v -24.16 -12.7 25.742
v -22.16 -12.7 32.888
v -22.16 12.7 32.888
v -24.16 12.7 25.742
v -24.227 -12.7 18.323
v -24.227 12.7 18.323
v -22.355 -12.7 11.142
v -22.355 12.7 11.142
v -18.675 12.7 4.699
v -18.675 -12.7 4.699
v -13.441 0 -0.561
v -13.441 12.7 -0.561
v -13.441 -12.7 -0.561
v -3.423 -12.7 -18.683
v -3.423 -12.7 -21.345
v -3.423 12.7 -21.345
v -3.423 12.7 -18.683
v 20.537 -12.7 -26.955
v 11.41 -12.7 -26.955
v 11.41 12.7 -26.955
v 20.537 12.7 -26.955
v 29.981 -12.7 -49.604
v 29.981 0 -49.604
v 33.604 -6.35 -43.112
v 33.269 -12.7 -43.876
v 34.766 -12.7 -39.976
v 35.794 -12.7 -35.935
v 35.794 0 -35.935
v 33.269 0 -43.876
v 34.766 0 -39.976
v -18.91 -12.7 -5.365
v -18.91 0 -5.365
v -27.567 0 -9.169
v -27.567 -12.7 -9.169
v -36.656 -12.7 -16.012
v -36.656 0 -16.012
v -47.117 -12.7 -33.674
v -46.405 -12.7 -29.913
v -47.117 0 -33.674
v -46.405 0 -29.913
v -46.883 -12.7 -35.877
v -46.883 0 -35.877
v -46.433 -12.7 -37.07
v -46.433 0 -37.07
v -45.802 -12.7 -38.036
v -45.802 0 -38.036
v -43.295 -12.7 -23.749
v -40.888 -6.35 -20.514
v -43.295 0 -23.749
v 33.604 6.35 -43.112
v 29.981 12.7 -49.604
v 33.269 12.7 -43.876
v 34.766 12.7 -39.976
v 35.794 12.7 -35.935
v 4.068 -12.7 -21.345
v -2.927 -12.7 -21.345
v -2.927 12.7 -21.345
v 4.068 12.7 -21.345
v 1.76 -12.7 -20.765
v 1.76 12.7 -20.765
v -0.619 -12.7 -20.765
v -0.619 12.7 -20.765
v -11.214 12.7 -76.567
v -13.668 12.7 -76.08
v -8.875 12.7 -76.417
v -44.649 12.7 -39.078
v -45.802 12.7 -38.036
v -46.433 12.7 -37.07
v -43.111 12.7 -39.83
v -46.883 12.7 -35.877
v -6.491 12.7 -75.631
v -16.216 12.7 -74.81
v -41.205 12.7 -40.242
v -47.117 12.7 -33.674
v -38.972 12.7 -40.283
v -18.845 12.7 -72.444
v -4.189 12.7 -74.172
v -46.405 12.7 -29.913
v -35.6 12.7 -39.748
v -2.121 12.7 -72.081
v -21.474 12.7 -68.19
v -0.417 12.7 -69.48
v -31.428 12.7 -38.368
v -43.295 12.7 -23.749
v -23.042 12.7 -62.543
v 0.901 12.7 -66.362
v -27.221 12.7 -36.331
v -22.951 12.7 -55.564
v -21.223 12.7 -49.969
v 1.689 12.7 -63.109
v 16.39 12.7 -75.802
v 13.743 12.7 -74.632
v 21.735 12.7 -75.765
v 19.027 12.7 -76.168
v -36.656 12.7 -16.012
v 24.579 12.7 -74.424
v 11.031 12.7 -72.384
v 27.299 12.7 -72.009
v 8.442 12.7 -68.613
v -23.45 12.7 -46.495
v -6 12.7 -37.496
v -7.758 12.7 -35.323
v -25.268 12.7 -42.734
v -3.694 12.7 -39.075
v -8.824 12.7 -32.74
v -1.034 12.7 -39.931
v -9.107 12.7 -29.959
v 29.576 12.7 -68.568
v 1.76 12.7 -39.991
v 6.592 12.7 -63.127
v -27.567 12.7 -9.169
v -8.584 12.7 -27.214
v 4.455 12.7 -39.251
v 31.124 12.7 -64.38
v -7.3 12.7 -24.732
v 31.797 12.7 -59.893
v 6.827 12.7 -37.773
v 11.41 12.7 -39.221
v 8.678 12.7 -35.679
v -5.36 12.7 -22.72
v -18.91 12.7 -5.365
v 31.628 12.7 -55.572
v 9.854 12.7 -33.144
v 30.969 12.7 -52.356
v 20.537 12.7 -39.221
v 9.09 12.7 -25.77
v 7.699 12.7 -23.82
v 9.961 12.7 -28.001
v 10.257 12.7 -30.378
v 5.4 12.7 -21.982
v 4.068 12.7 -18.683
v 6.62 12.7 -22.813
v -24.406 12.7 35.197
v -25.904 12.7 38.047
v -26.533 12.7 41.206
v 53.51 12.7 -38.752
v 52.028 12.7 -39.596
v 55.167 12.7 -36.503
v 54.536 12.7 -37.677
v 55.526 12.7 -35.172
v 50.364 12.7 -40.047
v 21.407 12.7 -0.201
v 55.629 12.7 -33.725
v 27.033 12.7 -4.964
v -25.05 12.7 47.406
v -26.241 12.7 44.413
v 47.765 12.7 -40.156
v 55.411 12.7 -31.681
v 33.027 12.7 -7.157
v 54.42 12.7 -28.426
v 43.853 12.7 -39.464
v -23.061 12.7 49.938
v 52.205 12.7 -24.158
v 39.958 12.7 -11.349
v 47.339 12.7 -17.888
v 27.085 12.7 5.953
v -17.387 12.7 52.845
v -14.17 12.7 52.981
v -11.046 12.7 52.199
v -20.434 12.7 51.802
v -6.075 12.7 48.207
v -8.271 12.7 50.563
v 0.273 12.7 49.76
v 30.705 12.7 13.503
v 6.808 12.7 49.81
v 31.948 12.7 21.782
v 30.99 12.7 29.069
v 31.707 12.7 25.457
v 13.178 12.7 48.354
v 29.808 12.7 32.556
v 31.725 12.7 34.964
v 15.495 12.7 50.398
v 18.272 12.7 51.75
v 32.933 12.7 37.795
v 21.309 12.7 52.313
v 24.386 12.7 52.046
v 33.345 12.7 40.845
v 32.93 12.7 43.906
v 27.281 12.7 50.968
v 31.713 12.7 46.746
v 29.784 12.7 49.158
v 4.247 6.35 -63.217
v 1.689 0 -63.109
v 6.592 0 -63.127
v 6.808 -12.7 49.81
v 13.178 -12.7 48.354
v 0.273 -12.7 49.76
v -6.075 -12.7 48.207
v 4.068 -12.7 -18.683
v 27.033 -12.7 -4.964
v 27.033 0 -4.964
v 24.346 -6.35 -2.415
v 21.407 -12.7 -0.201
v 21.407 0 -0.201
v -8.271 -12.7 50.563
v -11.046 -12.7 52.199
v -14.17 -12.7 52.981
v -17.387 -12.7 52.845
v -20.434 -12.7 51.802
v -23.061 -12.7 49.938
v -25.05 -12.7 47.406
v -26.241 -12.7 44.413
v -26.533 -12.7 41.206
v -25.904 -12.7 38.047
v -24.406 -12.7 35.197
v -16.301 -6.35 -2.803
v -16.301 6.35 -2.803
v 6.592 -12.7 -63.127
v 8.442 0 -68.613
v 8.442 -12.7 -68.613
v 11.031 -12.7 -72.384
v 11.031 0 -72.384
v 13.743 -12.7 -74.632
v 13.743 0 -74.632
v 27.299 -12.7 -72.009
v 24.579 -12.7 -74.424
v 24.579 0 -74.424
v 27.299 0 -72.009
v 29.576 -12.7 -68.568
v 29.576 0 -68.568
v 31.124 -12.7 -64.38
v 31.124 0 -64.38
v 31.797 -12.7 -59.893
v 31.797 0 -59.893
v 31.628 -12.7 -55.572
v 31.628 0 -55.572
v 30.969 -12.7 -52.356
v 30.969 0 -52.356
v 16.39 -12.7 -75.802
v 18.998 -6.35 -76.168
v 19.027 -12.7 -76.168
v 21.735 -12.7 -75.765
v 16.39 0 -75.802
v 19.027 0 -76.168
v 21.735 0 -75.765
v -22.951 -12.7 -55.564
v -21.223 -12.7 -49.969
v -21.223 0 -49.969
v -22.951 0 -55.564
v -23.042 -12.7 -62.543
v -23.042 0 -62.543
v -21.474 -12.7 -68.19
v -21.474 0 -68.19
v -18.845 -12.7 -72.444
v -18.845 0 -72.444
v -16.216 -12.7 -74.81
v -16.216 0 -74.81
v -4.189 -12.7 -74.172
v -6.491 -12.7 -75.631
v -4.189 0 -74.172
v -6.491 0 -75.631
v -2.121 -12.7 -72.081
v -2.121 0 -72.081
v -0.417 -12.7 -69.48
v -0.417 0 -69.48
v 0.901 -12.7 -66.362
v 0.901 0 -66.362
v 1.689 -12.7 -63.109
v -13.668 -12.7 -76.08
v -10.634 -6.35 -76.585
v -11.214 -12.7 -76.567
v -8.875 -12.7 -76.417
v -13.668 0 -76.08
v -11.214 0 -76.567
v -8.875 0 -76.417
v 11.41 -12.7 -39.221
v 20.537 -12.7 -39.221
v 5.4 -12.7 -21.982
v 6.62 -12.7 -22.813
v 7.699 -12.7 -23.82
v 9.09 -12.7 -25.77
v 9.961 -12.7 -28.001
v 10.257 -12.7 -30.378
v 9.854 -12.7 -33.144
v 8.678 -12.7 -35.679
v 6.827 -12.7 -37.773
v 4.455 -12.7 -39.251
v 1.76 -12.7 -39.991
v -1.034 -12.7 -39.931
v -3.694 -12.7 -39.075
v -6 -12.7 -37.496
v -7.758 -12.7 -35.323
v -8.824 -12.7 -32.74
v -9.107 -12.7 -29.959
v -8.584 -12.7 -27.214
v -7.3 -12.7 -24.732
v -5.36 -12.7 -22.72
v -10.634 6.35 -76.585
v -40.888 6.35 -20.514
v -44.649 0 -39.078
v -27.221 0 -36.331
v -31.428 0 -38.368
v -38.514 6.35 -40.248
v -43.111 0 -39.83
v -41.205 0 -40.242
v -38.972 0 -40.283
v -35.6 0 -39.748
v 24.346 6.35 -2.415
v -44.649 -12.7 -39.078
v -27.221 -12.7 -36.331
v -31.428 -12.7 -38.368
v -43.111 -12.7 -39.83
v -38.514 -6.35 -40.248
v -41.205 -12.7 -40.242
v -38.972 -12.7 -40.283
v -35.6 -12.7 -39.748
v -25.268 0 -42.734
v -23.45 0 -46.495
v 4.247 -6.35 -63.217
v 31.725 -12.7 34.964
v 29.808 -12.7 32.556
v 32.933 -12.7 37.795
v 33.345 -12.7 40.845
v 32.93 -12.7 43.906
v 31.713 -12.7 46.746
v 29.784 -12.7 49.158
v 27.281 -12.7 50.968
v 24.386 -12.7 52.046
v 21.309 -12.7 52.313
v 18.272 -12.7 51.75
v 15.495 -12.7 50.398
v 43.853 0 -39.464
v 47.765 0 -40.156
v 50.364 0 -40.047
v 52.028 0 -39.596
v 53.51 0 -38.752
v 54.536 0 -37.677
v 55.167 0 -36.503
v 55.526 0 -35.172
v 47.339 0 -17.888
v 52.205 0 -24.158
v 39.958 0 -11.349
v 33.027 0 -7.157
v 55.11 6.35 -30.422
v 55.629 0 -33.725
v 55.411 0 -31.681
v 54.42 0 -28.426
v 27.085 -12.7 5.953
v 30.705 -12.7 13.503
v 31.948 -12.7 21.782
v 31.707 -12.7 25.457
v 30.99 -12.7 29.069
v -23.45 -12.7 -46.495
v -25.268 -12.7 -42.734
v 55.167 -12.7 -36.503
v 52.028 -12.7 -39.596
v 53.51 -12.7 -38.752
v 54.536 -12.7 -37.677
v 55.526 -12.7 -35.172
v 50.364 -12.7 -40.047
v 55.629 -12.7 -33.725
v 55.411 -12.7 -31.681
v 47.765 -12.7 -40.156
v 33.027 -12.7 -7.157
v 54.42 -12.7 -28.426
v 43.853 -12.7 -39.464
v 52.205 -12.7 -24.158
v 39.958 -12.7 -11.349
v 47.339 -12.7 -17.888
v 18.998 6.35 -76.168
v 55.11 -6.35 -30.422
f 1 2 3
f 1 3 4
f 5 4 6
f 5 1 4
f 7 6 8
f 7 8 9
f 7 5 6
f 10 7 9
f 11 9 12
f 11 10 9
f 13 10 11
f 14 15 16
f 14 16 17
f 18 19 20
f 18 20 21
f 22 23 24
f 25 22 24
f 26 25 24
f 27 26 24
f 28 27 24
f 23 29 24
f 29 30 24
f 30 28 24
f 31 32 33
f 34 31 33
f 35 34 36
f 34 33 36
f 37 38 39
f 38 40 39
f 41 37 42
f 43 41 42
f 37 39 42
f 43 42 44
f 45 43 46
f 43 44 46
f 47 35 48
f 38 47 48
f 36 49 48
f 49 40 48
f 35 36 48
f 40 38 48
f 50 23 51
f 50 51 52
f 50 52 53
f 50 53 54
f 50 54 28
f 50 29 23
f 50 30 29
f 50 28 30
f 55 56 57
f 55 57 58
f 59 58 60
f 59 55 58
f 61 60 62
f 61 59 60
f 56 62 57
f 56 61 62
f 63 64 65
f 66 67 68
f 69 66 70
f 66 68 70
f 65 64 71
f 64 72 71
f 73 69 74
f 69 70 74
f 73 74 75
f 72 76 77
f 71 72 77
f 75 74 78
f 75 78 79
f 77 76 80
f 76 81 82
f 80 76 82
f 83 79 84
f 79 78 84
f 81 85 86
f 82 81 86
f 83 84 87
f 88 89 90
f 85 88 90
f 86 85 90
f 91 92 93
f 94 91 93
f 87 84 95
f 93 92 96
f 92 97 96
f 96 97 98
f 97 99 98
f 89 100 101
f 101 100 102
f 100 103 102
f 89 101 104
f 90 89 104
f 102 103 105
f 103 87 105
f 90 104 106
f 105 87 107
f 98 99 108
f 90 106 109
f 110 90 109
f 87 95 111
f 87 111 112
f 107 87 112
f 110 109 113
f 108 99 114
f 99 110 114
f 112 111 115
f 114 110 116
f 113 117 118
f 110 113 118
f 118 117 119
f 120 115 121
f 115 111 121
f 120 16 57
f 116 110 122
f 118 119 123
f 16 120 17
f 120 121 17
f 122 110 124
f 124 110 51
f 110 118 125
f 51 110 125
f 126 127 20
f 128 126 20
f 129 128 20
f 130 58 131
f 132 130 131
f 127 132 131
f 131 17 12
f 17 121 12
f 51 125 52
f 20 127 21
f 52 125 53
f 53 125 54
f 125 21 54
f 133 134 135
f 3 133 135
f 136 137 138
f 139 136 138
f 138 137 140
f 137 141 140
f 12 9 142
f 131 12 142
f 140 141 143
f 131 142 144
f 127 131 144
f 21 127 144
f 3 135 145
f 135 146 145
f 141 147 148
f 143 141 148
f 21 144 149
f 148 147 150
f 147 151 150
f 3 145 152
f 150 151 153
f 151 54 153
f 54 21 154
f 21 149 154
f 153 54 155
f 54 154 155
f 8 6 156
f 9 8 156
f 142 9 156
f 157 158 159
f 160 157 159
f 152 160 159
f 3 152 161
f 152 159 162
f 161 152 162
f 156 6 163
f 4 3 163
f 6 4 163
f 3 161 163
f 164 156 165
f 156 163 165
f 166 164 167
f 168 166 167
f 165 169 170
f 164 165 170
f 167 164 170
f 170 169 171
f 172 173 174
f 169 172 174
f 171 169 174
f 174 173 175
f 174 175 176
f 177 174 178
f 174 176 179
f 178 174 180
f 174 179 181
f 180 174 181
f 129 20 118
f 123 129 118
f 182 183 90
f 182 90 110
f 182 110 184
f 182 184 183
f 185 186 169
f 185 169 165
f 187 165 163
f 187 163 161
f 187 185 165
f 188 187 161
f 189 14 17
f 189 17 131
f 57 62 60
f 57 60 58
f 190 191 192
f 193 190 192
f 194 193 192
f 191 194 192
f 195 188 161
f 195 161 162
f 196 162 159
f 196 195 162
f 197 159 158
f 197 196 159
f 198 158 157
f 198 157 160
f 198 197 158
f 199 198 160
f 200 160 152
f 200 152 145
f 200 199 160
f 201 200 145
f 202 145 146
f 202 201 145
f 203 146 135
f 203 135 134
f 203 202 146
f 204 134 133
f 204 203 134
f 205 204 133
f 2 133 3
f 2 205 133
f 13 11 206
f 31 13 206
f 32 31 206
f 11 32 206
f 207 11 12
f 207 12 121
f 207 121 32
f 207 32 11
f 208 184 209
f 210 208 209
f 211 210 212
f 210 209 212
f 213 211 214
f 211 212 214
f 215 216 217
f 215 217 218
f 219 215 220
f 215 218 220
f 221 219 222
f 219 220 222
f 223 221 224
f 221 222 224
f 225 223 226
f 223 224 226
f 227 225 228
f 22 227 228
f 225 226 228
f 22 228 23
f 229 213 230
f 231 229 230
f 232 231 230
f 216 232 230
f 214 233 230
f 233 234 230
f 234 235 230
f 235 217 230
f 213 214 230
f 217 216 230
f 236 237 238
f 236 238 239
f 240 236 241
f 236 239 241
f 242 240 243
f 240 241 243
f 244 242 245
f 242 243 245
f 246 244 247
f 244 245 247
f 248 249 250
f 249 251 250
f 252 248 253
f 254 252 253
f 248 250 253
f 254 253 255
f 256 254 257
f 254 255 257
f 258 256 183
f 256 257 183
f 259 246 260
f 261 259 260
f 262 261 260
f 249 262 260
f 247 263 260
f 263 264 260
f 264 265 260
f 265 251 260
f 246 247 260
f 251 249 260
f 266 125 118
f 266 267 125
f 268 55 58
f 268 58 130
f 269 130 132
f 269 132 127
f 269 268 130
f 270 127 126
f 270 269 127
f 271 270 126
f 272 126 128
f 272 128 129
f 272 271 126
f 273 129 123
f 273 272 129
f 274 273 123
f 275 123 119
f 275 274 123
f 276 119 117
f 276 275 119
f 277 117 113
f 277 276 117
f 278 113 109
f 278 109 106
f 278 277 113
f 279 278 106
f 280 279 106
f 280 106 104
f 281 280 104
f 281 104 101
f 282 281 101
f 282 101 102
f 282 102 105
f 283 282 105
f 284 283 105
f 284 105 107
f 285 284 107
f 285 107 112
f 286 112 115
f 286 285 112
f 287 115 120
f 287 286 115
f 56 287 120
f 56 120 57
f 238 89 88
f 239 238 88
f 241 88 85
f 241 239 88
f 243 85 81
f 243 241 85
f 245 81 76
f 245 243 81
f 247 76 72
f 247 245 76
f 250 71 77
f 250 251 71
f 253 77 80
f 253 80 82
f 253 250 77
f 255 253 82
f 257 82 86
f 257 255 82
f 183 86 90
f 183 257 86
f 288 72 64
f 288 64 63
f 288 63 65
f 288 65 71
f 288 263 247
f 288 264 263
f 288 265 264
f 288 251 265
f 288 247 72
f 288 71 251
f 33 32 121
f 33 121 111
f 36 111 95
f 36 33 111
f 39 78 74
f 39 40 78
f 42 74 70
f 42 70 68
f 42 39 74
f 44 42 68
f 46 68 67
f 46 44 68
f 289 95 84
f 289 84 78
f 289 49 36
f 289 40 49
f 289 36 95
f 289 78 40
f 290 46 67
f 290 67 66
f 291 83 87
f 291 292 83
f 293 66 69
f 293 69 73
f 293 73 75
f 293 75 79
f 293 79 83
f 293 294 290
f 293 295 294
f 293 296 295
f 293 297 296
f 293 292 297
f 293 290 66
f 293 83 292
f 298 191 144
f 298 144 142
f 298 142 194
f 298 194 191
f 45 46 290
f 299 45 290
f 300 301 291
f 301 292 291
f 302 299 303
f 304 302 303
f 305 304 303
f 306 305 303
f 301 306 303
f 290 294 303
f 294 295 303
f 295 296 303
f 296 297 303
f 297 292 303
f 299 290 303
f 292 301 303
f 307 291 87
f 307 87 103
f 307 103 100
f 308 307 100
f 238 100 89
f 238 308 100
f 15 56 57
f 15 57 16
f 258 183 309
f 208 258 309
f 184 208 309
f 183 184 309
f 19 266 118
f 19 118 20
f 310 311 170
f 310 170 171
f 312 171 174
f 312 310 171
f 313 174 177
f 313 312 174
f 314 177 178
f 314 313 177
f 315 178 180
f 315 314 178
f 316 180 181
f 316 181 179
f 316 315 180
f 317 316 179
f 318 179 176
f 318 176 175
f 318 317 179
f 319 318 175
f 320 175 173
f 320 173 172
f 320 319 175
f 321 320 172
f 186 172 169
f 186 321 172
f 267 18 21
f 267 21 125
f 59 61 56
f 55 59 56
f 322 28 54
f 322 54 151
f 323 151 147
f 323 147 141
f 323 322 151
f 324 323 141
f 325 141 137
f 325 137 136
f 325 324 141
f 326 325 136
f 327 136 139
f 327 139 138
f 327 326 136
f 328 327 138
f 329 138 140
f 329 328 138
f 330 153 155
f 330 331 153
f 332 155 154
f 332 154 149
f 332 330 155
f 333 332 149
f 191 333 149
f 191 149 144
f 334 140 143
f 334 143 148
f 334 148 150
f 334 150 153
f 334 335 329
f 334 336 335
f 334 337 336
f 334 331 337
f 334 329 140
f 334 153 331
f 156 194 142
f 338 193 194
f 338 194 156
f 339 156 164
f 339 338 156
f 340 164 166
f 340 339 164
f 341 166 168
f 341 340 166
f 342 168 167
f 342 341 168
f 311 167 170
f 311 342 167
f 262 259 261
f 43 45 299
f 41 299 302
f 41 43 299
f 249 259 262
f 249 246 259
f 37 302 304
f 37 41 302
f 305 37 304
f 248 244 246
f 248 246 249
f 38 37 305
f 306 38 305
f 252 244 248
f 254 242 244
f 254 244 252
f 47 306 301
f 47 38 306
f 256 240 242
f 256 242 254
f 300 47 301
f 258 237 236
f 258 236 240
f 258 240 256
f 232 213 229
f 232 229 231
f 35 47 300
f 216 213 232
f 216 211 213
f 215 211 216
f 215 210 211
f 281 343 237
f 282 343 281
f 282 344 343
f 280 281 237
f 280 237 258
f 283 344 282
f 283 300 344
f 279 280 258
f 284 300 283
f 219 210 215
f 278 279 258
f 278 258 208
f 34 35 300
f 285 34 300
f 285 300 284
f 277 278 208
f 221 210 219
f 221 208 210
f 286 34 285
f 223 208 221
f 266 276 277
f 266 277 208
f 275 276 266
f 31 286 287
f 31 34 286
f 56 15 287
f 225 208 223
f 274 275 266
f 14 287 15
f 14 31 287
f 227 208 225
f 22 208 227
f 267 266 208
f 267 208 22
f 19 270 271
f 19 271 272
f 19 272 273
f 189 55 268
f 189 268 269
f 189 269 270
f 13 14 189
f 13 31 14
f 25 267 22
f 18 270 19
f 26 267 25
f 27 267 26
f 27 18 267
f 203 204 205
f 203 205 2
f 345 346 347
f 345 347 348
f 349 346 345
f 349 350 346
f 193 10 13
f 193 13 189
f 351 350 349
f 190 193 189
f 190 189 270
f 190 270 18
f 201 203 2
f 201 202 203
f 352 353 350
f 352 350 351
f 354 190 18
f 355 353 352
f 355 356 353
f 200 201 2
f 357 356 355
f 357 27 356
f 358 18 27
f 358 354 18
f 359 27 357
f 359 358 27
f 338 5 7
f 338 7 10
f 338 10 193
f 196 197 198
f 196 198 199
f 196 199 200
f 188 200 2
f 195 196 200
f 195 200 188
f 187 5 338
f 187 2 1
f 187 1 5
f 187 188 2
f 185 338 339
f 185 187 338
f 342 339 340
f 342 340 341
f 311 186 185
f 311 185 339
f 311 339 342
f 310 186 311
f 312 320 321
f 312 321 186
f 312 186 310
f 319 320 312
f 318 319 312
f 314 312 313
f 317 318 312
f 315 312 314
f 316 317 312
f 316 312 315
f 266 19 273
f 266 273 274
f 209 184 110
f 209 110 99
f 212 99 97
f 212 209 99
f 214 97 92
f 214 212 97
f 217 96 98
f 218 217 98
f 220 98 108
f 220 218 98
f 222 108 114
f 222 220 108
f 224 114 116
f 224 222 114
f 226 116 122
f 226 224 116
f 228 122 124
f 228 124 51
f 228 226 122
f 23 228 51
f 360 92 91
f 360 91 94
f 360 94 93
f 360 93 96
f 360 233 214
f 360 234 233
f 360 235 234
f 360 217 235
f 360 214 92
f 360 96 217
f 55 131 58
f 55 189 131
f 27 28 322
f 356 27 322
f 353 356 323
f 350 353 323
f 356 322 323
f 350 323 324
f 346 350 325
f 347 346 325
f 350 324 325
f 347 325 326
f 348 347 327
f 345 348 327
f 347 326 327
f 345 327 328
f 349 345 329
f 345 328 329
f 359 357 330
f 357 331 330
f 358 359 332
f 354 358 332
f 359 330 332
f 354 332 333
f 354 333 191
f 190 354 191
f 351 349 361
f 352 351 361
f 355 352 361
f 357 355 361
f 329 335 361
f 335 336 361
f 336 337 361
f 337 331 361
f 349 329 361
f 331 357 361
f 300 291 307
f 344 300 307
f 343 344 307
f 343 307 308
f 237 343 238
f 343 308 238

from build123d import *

# Parameters (mm, degrees)
F1_DEPTH = 12.7


with BuildPart() as f1:
    # F0 (on Front) → F1 (new body, symmetric)
    with BuildSketch(Plane.XZ):
        with BuildLine():
            ThreePointArc((21.4072020605, -0.2005026234), (29.1763847833, 9.5927644936), (31.9477205013, 21.7824314022))
            ThreePointArc((31.9477205013, 21.7824314022), (31.407623557, 27.2745103789), (29.808025642, 32.5561694654))
            ThreePointArc((29.808025642, 32.5561694654), (13.9560593574, 32.5213958074), (13.178397571, 48.3543136194))
            ThreePointArc((13.178397571, 48.3543136194), (3.538752003, 49.9752850855), (-6.075013926, 48.2072862636))
            ThreePointArc((-6.075013926, 48.2072862636), (-4.5821594527, 45.1562153753), (-4.0689174459, 41.7985032545))
            ThreePointArc((-4.0689174459, 41.7985032545), (-10.3425888827, 31.7152108279), (-22.1602111332, 32.8880466238))
            ThreePointArc((-22.1602111332, 32.8880466238), (-23.5279097172, 14.6705886204), (-13.4407785602, -0.5608315546))
            add(Edge.make_bspline(
                [(21.4072020605, -0.2005026234), (3.8738448753, 11.5030083296), (-13.4407785602, -0.5608315546)],
                knots=[2.5795956317, 2.5795956317, 2.5795956317, 3.7230991014, 3.7230991014, 3.7230991014], degree=2, weights=[1, 0.8409543917, 1]))
        make_face()
        with BuildLine():
            ThreePointArc((13.178397571, 48.3543136194), (13.9560593574, 32.5213958074), (29.808025642, 32.5561694654))
            ThreePointArc((29.808025642, 32.5561694654), (23.1724221434, 42.2228318625), (13.178397571, 48.3543136194))
        make_face()
        with BuildLine():
            ThreePointArc((13.178397571, 48.3543136194), (23.1724221434, 42.2228318625), (29.808025642, 32.5561694654))
            ThreePointArc((29.808025642, 32.5561694654), (32.423912555, 36.3391968743), (33.3451540291, 40.8453565324))
            ThreePointArc((33.3451540291, 40.8453565324), (25.8701142557, 51.6050324403), (13.178397571, 48.3543136194))
        make_face()
        with BuildLine():
            add(Edge.make_bspline(
                [(27.032929556, -4.9640346513), (24.47286462, -2.2468315132), (21.4072020605, -0.2005026234)],
                knots=[2.3555291834, 2.3555291834, 2.3555291834, 2.5795956317, 2.5795956317, 2.5795956317], degree=2, weights=[1, 0.9937308397, 1]))
            ThreePointArc((21.4072020605, -0.2005026234), (4.045552476, -6.4097372456), (-13.4407785602, -0.5608315546))
            add(Edge.make_bspline(
                [(-13.4407785602, -0.5608315546), (-16.4269767093, -2.64144373), (-18.9101642422, -5.3654058694)],
                knots=[3.7230991014, 3.7230991014, 3.7230991014, 3.9441397555, 3.9441397555, 3.9441397555], degree=2, weights=[1, 0.9938988428, 1]))
            add(Edge.make_bspline(
                [(-27.220592602, -36.3314006709), (-10.5893694739, -27.0919670095), (-7.1072871664, -14.1171674007), (-3.6252048589, -1.1423677919), (-18.9101642422, -5.3654058694)],
                knots=[1.1914468438, 1.1914468438, 1.1914468438, 2.5677054181, 2.5677054181, 3.9439639925, 3.9439639925, 3.9439639925], degree=2, weights=[1, 0.7724354431, 1, 0.7724354431, 1]))
            add(Edge.make_bspline(
                [(-27.220592602, -36.3314006709), (-25.6755646838, -43.8684917338), (-21.223233788, -49.9691174456)],
                knots=[4.9263462771, 4.9263462771, 4.9263462771, 5.3708124747, 5.3708124747, 5.3708124747], degree=2, weights=[1, 0.9754076882, 1]))
            add(Edge.make_bspline(
                [(1.6894122595, -63.1094222428), (3.990089745, -49.0501097367), (-5.7417760212, -43.4689262213), (-15.4736417874, -37.887742706), (-21.223233788, -49.9691174456)],
                knots=[1.3510901139, 1.3510901139, 1.3510901139, 2.7437488102, 2.7437488102, 4.1364075066, 4.1364075066, 4.1364075066], degree=2, weights=[1, 0.7672017282, 1, 0.7672017282, 1]))
            add(Edge.make_bspline(
                [(1.6894122595, -63.1094222428), (2.9663677621, -63.2172799366), (4.2473710941, -63.2172799366)],
                knots=[6.2036673158, 6.2036673158, 6.2036673158, 6.2831853072, 6.2831853072, 6.2831853072], degree=2, weights=[1, 0.9992097152, 1]))
            add(Edge.make_bspline(
                [(4.2473710941, -63.2172799366), (5.4210318652, -63.2172799366), (6.5915787023, -63.1267179419)],
                knots=[0, 0, 0, 0.0728608894, 0.0728608894, 0.0728608894], degree=2, weights=[1, 0.9993364847, 1]))
            add(Edge.make_bspline(
                [(29.9807177647, -49.6040588443), (24.2311078692, -36.6154787146), (13.9923485543, -42.5351173737), (3.7535892394, -48.4547560328), (6.5915787023, -63.1267179419)],
                knots=[2.1142110715, 2.1142110715, 2.1142110715, 3.5423376984, 3.5423376984, 4.9704643252, 4.9704643252, 4.9704643252], degree=2, weights=[1, 0.7557070179, 1, 0.7557070179, 1]))
            add(Edge.make_bspline(
                [(29.9807177647, -49.6040588443), (34.3392330374, -43.4630345178), (35.7943407329, -35.9346430319)],
                knots=[0.9258249083, 0.9258249083, 0.9258249083, 1.3687189484, 1.3687189484, 1.3687189484], degree=2, weights=[1, 0.9755806451, 1]))
            add(Edge.make_bspline(
                [(17.4818759947, -6.6058057692), (6.8734541188, -19.0145870238), (35.7943407329, -35.9346430319)],
                knots=[0, 0, 0, 1.9426934521, 1.9426934521, 1.9426934521], degree=2, weights=[1, 0.5641881238, 1]))
            add(Edge.make_bspline(
                [(27.032929556, -4.9640346513), (20.2593941608, -3.356913921), (17.4818759947, -6.6058057692)],
                knots=[5.5513806327, 5.5513806327, 5.5513806327, 6.2831853072, 6.2831853072, 6.2831853072], degree=2, weights=[1, 0.9338012923, 1]))
        make_face()
        with BuildLine():
            ThreePointArc((7.6989617268, -23.8198920655), (9.594748521, -26.8584254178), (10.2568488529, -30.3781293333))
            ThreePointArc((10.2568488529, -30.3781293333), (-4.9042904668, -38.3689082877), (-2.9271558048, -21.3452884523))
            Line((-2.9271558048, -21.3452884523), (-3.4228879958, -21.3452884523))
            Line((-3.4228879958, -21.3452884523), (-3.4228879958, -18.6832621694))
            Line((-3.4228879958, -18.6832621694), (0, -18.6832621694))
            Line((0, -18.6832621694), (4.0681211865, -18.6832621694))
            Line((4.0681211865, -18.6832621694), (4.0681211865, -21.3452884523))
            ThreePointArc((4.0681211865, -21.3452884523), (6.0257103863, -22.3739941384), (7.6989617268, -23.8198920655))
        make_face(mode=Mode.SUBTRACT)
        Polygon((11.4096151665, -39.2205929384), (11.4096151665, -26.9552450627), (15.9734645858, -26.9552450627), (20.5373140052, -26.9552450627), (20.5373140052, -39.2205929384), align=None, mode=Mode.SUBTRACT)
        with BuildLine():
            ThreePointArc((-13.4407785602, -0.5608315546), (4.045552476, -6.4097372456), (21.4072020605, -0.2005026234))
            add(Edge.make_bspline(
                [(21.4072020605, -0.2005026234), (3.8738448753, 11.5030083296), (-13.4407785602, -0.5608315546)],
                knots=[2.5795956317, 2.5795956317, 2.5795956317, 3.7230991014, 3.7230991014, 3.7230991014], degree=2, weights=[1, 0.8409543917, 1]))
        make_face()
        with BuildLine():
            add(Edge.make_bspline(
                [(35.7943407329, -35.9346430319), (60.8095787908, -50.5697140325), (55.1097658811, -30.4215130287), (49.4099529714, -10.2733120249), (27.032929556, -4.9640346513)],
                knots=[1.9426934521, 1.9426934521, 1.9426934521, 3.7470370424, 3.7470370424, 5.5513806327, 5.5513806327, 5.5513806327], degree=2, weights=[1, 0.619907278, 1, 0.619907278, 1]))
            add(Edge.make_bspline(
                [(35.7943407329, -35.9346430319), (39.2700257665, -17.9522505972), (27.032929556, -4.9640346513)],
                knots=[1.3687189484, 1.3687189484, 1.3687189484, 2.3555291834, 2.3555291834, 2.3555291834], degree=2, weights=[1, 0.88072521, 1]))
        make_face()
        with BuildLine():
            add(Edge.make_bspline(
                [(35.7943407329, -35.9346430319), (39.2700257665, -17.9522505972), (27.032929556, -4.9640346513)],
                knots=[1.3687189484, 1.3687189484, 1.3687189484, 2.3555291834, 2.3555291834, 2.3555291834], degree=2, weights=[1, 0.88072521, 1]))
            add(Edge.make_bspline(
                [(27.032929556, -4.9640346513), (20.2593941608, -3.356913921), (17.4818759947, -6.6058057692)],
                knots=[5.5513806327, 5.5513806327, 5.5513806327, 6.2831853072, 6.2831853072, 6.2831853072], degree=2, weights=[1, 0.9338012923, 1]))
            add(Edge.make_bspline(
                [(17.4818759947, -6.6058057692), (6.8734541188, -19.0145870238), (35.7943407329, -35.9346430319)],
                knots=[0, 0, 0, 1.9426934521, 1.9426934521, 1.9426934521], degree=2, weights=[1, 0.5641881238, 1]))
        make_face()
        with BuildLine():
            ThreePointArc((-4.0689174459, 41.7985032545), (-4.5821594527, 45.1562153753), (-6.075013926, 48.2072862636))
            ThreePointArc((-6.075013926, 48.2072862636), (-15.6898722823, 42.198538731), (-22.1602111332, 32.8880466238))
            ThreePointArc((-22.1602111332, 32.8880466238), (-10.3425888827, 31.7152108279), (-4.0689174459, 41.7985032545))
        make_face()
        with BuildLine():
            ThreePointArc((-22.1602111332, 32.8880466238), (-15.6898722823, 42.198538731), (-6.075013926, 48.2072862636))
            ThreePointArc((-6.075013926, 48.2072862636), (-23.0605895831, 49.9377897728), (-22.1602111332, 32.8880466238))
        make_face()
        with BuildLine():
            add(Edge.make_bspline(
                [(-27.220592602, -36.3314006709), (-10.5893694739, -27.0919670095), (-7.1072871664, -14.1171674007), (-3.6252048589, -1.1423677919), (-18.9101642422, -5.3654058694)],
                knots=[1.1914468438, 1.1914468438, 1.1914468438, 2.5677054181, 2.5677054181, 3.9439639925, 3.9439639925, 3.9439639925], degree=2, weights=[1, 0.7724354431, 1, 0.7724354431, 1]))
            add(Edge.make_bspline(
                [(-18.9101642422, -5.3654058694), (-30.8773052041, -18.492903678), (-27.220592602, -36.3314006709)],
                knots=[3.9441397555, 3.9441397555, 3.9441397555, 4.9263462771, 4.9263462771, 4.9263462771], degree=2, weights=[1, 0.8818130986, 1]))
        make_face()
        with BuildLine():
            add(Edge.make_bspline(
                [(-18.9101642422, -5.3654058694), (-30.8773052041, -18.492903678), (-27.220592602, -36.3314006709)],
                knots=[3.9441397555, 3.9441397555, 3.9441397555, 4.9263462771, 4.9263462771, 4.9263462771], degree=2, weights=[1, 0.8818130986, 1]))
            add(Edge.make_bspline(
                [(-18.9101642422, -5.3654058694), (-62.7356726046, -17.473831279), (-45.8018668681, -38.0363134591)],
                knots=[3.9439639925, 3.9439639925, 3.9439639925, 6.2831853072, 6.2831853072, 6.2831853072], degree=2, weights=[1, 0.3905101422, 1]))
            add(Edge.make_bspline(
                [(-45.8018668681, -38.0363134591), (-40.9325572153, -43.9490476976), (-27.220592602, -36.3314006709)],
                knots=[0, 0, 0, 1.1914468438, 1.1914468438, 1.1914468438], degree=2, weights=[1, 0.8277427979, 1]))
        make_face()
        with BuildLine():
            add(Edge.make_bspline(
                [(18.9978633271, -76.1678158343), (41.7396043038, -76.1678158343), (29.9807177647, -49.6040588443)],
                knots=[0, 0, 0, 2.1142110715, 2.1142110715, 2.1142110715], degree=2, weights=[1, 0.4913950322, 1]))
            add(Edge.make_bspline(
                [(6.5915787023, -63.1267179419), (21.1844822405, -61.9977050648), (29.9807177647, -49.6040588443)],
                knots=[0.0728608894, 0.0728608894, 0.0728608894, 0.9258249083, 0.9258249083, 0.9258249083], degree=2, weights=[1, 0.9104266694, 1]))
            add(Edge.make_bspline(
                [(6.5915787023, -63.1267179419), (9.114111042, -76.1678158343), (18.9978633271, -76.1678158343)],
                knots=[4.9704643252, 4.9704643252, 4.9704643252, 6.2831853072, 6.2831853072, 6.2831853072], degree=2, weights=[1, 0.7922184388, 1]))
        make_face()
        with BuildLine():
            add(Edge.make_bspline(
                [(6.5915787023, -63.1267179419), (21.1844822405, -61.9977050648), (29.9807177647, -49.6040588443)],
                knots=[0.0728608894, 0.0728608894, 0.0728608894, 0.9258249083, 0.9258249083, 0.9258249083], degree=2, weights=[1, 0.9104266694, 1]))
            add(Edge.make_bspline(
                [(29.9807177647, -49.6040588443), (24.2311078692, -36.6154787146), (13.9923485543, -42.5351173737), (3.7535892394, -48.4547560328), (6.5915787023, -63.1267179419)],
                knots=[2.1142110715, 2.1142110715, 2.1142110715, 3.5423376984, 3.5423376984, 4.9704643252, 4.9704643252, 4.9704643252], degree=2, weights=[1, 0.7557070179, 1, 0.7557070179, 1]))
        make_face()
        with BuildLine():
            add(Edge.make_bspline(
                [(1.6894122595, -63.1094222428), (3.990089745, -49.0501097367), (-5.7417760212, -43.4689262213), (-15.4736417874, -37.887742706), (-21.223233788, -49.9691174456)],
                knots=[1.3510901139, 1.3510901139, 1.3510901139, 2.7437488102, 2.7437488102, 4.1364075066, 4.1364075066, 4.1364075066], degree=2, weights=[1, 0.7672017282, 1, 0.7672017282, 1]))
            add(Edge.make_bspline(
                [(-21.223233788, -49.9691174456), (-12.5084441764, -61.9102042206), (1.6894122595, -63.1094222428)],
                knots=[5.3708124747, 5.3708124747, 5.3708124747, 6.2036673158, 6.2036673158, 6.2036673158], degree=2, weights=[1, 0.9145398668, 1]))
        make_face()
        with BuildLine():
            add(Edge.make_bspline(
                [(-21.223233788, -49.9691174456), (-12.5084441764, -61.9102042206), (1.6894122595, -63.1094222428)],
                knots=[5.3708124747, 5.3708124747, 5.3708124747, 6.2036673158, 6.2036673158, 6.2036673158], degree=2, weights=[1, 0.9145398668, 1]))
            add(Edge.make_bspline(
                [(-21.223233788, -49.9691174456), (-33.8898636884, -76.5849716658), (-10.6337546143, -76.5849716658)],
                knots=[4.1364075066, 4.1364075066, 4.1364075066, 6.2831853072, 6.2831853072, 6.2831853072], degree=2, weights=[1, 0.4771487326, 1]))
            add(Edge.make_bspline(
                [(-10.6337546143, -76.5849716658), (-0.5157377539, -76.5849716658), (1.6894122595, -63.1094222428)],
                knots=[0, 0, 0, 1.3510901139, 1.3510901139, 1.3510901139], degree=2, weights=[1, 0.7803662306, 1]))
        make_face()
    extrude(amount=F1_DEPTH, both=True)


with BuildPart() as f1b:
    # F0 (on Front) → F1, piece 2 (new body, symmetric)
    with BuildSketch(Plane.XZ):
        with BuildLine():
            ThreePointArc((4.0681211865, -21.3452884523), (0.5704826908, -20.6917631711), (-2.9271558048, -21.3452884523))
            Line((-2.9271558048, -21.3452884523), (4.0681211865, -21.3452884523))
        make_face()
    extrude(amount=F1_DEPTH, both=True)


solid = Compound([f1.part, f1b.part])
